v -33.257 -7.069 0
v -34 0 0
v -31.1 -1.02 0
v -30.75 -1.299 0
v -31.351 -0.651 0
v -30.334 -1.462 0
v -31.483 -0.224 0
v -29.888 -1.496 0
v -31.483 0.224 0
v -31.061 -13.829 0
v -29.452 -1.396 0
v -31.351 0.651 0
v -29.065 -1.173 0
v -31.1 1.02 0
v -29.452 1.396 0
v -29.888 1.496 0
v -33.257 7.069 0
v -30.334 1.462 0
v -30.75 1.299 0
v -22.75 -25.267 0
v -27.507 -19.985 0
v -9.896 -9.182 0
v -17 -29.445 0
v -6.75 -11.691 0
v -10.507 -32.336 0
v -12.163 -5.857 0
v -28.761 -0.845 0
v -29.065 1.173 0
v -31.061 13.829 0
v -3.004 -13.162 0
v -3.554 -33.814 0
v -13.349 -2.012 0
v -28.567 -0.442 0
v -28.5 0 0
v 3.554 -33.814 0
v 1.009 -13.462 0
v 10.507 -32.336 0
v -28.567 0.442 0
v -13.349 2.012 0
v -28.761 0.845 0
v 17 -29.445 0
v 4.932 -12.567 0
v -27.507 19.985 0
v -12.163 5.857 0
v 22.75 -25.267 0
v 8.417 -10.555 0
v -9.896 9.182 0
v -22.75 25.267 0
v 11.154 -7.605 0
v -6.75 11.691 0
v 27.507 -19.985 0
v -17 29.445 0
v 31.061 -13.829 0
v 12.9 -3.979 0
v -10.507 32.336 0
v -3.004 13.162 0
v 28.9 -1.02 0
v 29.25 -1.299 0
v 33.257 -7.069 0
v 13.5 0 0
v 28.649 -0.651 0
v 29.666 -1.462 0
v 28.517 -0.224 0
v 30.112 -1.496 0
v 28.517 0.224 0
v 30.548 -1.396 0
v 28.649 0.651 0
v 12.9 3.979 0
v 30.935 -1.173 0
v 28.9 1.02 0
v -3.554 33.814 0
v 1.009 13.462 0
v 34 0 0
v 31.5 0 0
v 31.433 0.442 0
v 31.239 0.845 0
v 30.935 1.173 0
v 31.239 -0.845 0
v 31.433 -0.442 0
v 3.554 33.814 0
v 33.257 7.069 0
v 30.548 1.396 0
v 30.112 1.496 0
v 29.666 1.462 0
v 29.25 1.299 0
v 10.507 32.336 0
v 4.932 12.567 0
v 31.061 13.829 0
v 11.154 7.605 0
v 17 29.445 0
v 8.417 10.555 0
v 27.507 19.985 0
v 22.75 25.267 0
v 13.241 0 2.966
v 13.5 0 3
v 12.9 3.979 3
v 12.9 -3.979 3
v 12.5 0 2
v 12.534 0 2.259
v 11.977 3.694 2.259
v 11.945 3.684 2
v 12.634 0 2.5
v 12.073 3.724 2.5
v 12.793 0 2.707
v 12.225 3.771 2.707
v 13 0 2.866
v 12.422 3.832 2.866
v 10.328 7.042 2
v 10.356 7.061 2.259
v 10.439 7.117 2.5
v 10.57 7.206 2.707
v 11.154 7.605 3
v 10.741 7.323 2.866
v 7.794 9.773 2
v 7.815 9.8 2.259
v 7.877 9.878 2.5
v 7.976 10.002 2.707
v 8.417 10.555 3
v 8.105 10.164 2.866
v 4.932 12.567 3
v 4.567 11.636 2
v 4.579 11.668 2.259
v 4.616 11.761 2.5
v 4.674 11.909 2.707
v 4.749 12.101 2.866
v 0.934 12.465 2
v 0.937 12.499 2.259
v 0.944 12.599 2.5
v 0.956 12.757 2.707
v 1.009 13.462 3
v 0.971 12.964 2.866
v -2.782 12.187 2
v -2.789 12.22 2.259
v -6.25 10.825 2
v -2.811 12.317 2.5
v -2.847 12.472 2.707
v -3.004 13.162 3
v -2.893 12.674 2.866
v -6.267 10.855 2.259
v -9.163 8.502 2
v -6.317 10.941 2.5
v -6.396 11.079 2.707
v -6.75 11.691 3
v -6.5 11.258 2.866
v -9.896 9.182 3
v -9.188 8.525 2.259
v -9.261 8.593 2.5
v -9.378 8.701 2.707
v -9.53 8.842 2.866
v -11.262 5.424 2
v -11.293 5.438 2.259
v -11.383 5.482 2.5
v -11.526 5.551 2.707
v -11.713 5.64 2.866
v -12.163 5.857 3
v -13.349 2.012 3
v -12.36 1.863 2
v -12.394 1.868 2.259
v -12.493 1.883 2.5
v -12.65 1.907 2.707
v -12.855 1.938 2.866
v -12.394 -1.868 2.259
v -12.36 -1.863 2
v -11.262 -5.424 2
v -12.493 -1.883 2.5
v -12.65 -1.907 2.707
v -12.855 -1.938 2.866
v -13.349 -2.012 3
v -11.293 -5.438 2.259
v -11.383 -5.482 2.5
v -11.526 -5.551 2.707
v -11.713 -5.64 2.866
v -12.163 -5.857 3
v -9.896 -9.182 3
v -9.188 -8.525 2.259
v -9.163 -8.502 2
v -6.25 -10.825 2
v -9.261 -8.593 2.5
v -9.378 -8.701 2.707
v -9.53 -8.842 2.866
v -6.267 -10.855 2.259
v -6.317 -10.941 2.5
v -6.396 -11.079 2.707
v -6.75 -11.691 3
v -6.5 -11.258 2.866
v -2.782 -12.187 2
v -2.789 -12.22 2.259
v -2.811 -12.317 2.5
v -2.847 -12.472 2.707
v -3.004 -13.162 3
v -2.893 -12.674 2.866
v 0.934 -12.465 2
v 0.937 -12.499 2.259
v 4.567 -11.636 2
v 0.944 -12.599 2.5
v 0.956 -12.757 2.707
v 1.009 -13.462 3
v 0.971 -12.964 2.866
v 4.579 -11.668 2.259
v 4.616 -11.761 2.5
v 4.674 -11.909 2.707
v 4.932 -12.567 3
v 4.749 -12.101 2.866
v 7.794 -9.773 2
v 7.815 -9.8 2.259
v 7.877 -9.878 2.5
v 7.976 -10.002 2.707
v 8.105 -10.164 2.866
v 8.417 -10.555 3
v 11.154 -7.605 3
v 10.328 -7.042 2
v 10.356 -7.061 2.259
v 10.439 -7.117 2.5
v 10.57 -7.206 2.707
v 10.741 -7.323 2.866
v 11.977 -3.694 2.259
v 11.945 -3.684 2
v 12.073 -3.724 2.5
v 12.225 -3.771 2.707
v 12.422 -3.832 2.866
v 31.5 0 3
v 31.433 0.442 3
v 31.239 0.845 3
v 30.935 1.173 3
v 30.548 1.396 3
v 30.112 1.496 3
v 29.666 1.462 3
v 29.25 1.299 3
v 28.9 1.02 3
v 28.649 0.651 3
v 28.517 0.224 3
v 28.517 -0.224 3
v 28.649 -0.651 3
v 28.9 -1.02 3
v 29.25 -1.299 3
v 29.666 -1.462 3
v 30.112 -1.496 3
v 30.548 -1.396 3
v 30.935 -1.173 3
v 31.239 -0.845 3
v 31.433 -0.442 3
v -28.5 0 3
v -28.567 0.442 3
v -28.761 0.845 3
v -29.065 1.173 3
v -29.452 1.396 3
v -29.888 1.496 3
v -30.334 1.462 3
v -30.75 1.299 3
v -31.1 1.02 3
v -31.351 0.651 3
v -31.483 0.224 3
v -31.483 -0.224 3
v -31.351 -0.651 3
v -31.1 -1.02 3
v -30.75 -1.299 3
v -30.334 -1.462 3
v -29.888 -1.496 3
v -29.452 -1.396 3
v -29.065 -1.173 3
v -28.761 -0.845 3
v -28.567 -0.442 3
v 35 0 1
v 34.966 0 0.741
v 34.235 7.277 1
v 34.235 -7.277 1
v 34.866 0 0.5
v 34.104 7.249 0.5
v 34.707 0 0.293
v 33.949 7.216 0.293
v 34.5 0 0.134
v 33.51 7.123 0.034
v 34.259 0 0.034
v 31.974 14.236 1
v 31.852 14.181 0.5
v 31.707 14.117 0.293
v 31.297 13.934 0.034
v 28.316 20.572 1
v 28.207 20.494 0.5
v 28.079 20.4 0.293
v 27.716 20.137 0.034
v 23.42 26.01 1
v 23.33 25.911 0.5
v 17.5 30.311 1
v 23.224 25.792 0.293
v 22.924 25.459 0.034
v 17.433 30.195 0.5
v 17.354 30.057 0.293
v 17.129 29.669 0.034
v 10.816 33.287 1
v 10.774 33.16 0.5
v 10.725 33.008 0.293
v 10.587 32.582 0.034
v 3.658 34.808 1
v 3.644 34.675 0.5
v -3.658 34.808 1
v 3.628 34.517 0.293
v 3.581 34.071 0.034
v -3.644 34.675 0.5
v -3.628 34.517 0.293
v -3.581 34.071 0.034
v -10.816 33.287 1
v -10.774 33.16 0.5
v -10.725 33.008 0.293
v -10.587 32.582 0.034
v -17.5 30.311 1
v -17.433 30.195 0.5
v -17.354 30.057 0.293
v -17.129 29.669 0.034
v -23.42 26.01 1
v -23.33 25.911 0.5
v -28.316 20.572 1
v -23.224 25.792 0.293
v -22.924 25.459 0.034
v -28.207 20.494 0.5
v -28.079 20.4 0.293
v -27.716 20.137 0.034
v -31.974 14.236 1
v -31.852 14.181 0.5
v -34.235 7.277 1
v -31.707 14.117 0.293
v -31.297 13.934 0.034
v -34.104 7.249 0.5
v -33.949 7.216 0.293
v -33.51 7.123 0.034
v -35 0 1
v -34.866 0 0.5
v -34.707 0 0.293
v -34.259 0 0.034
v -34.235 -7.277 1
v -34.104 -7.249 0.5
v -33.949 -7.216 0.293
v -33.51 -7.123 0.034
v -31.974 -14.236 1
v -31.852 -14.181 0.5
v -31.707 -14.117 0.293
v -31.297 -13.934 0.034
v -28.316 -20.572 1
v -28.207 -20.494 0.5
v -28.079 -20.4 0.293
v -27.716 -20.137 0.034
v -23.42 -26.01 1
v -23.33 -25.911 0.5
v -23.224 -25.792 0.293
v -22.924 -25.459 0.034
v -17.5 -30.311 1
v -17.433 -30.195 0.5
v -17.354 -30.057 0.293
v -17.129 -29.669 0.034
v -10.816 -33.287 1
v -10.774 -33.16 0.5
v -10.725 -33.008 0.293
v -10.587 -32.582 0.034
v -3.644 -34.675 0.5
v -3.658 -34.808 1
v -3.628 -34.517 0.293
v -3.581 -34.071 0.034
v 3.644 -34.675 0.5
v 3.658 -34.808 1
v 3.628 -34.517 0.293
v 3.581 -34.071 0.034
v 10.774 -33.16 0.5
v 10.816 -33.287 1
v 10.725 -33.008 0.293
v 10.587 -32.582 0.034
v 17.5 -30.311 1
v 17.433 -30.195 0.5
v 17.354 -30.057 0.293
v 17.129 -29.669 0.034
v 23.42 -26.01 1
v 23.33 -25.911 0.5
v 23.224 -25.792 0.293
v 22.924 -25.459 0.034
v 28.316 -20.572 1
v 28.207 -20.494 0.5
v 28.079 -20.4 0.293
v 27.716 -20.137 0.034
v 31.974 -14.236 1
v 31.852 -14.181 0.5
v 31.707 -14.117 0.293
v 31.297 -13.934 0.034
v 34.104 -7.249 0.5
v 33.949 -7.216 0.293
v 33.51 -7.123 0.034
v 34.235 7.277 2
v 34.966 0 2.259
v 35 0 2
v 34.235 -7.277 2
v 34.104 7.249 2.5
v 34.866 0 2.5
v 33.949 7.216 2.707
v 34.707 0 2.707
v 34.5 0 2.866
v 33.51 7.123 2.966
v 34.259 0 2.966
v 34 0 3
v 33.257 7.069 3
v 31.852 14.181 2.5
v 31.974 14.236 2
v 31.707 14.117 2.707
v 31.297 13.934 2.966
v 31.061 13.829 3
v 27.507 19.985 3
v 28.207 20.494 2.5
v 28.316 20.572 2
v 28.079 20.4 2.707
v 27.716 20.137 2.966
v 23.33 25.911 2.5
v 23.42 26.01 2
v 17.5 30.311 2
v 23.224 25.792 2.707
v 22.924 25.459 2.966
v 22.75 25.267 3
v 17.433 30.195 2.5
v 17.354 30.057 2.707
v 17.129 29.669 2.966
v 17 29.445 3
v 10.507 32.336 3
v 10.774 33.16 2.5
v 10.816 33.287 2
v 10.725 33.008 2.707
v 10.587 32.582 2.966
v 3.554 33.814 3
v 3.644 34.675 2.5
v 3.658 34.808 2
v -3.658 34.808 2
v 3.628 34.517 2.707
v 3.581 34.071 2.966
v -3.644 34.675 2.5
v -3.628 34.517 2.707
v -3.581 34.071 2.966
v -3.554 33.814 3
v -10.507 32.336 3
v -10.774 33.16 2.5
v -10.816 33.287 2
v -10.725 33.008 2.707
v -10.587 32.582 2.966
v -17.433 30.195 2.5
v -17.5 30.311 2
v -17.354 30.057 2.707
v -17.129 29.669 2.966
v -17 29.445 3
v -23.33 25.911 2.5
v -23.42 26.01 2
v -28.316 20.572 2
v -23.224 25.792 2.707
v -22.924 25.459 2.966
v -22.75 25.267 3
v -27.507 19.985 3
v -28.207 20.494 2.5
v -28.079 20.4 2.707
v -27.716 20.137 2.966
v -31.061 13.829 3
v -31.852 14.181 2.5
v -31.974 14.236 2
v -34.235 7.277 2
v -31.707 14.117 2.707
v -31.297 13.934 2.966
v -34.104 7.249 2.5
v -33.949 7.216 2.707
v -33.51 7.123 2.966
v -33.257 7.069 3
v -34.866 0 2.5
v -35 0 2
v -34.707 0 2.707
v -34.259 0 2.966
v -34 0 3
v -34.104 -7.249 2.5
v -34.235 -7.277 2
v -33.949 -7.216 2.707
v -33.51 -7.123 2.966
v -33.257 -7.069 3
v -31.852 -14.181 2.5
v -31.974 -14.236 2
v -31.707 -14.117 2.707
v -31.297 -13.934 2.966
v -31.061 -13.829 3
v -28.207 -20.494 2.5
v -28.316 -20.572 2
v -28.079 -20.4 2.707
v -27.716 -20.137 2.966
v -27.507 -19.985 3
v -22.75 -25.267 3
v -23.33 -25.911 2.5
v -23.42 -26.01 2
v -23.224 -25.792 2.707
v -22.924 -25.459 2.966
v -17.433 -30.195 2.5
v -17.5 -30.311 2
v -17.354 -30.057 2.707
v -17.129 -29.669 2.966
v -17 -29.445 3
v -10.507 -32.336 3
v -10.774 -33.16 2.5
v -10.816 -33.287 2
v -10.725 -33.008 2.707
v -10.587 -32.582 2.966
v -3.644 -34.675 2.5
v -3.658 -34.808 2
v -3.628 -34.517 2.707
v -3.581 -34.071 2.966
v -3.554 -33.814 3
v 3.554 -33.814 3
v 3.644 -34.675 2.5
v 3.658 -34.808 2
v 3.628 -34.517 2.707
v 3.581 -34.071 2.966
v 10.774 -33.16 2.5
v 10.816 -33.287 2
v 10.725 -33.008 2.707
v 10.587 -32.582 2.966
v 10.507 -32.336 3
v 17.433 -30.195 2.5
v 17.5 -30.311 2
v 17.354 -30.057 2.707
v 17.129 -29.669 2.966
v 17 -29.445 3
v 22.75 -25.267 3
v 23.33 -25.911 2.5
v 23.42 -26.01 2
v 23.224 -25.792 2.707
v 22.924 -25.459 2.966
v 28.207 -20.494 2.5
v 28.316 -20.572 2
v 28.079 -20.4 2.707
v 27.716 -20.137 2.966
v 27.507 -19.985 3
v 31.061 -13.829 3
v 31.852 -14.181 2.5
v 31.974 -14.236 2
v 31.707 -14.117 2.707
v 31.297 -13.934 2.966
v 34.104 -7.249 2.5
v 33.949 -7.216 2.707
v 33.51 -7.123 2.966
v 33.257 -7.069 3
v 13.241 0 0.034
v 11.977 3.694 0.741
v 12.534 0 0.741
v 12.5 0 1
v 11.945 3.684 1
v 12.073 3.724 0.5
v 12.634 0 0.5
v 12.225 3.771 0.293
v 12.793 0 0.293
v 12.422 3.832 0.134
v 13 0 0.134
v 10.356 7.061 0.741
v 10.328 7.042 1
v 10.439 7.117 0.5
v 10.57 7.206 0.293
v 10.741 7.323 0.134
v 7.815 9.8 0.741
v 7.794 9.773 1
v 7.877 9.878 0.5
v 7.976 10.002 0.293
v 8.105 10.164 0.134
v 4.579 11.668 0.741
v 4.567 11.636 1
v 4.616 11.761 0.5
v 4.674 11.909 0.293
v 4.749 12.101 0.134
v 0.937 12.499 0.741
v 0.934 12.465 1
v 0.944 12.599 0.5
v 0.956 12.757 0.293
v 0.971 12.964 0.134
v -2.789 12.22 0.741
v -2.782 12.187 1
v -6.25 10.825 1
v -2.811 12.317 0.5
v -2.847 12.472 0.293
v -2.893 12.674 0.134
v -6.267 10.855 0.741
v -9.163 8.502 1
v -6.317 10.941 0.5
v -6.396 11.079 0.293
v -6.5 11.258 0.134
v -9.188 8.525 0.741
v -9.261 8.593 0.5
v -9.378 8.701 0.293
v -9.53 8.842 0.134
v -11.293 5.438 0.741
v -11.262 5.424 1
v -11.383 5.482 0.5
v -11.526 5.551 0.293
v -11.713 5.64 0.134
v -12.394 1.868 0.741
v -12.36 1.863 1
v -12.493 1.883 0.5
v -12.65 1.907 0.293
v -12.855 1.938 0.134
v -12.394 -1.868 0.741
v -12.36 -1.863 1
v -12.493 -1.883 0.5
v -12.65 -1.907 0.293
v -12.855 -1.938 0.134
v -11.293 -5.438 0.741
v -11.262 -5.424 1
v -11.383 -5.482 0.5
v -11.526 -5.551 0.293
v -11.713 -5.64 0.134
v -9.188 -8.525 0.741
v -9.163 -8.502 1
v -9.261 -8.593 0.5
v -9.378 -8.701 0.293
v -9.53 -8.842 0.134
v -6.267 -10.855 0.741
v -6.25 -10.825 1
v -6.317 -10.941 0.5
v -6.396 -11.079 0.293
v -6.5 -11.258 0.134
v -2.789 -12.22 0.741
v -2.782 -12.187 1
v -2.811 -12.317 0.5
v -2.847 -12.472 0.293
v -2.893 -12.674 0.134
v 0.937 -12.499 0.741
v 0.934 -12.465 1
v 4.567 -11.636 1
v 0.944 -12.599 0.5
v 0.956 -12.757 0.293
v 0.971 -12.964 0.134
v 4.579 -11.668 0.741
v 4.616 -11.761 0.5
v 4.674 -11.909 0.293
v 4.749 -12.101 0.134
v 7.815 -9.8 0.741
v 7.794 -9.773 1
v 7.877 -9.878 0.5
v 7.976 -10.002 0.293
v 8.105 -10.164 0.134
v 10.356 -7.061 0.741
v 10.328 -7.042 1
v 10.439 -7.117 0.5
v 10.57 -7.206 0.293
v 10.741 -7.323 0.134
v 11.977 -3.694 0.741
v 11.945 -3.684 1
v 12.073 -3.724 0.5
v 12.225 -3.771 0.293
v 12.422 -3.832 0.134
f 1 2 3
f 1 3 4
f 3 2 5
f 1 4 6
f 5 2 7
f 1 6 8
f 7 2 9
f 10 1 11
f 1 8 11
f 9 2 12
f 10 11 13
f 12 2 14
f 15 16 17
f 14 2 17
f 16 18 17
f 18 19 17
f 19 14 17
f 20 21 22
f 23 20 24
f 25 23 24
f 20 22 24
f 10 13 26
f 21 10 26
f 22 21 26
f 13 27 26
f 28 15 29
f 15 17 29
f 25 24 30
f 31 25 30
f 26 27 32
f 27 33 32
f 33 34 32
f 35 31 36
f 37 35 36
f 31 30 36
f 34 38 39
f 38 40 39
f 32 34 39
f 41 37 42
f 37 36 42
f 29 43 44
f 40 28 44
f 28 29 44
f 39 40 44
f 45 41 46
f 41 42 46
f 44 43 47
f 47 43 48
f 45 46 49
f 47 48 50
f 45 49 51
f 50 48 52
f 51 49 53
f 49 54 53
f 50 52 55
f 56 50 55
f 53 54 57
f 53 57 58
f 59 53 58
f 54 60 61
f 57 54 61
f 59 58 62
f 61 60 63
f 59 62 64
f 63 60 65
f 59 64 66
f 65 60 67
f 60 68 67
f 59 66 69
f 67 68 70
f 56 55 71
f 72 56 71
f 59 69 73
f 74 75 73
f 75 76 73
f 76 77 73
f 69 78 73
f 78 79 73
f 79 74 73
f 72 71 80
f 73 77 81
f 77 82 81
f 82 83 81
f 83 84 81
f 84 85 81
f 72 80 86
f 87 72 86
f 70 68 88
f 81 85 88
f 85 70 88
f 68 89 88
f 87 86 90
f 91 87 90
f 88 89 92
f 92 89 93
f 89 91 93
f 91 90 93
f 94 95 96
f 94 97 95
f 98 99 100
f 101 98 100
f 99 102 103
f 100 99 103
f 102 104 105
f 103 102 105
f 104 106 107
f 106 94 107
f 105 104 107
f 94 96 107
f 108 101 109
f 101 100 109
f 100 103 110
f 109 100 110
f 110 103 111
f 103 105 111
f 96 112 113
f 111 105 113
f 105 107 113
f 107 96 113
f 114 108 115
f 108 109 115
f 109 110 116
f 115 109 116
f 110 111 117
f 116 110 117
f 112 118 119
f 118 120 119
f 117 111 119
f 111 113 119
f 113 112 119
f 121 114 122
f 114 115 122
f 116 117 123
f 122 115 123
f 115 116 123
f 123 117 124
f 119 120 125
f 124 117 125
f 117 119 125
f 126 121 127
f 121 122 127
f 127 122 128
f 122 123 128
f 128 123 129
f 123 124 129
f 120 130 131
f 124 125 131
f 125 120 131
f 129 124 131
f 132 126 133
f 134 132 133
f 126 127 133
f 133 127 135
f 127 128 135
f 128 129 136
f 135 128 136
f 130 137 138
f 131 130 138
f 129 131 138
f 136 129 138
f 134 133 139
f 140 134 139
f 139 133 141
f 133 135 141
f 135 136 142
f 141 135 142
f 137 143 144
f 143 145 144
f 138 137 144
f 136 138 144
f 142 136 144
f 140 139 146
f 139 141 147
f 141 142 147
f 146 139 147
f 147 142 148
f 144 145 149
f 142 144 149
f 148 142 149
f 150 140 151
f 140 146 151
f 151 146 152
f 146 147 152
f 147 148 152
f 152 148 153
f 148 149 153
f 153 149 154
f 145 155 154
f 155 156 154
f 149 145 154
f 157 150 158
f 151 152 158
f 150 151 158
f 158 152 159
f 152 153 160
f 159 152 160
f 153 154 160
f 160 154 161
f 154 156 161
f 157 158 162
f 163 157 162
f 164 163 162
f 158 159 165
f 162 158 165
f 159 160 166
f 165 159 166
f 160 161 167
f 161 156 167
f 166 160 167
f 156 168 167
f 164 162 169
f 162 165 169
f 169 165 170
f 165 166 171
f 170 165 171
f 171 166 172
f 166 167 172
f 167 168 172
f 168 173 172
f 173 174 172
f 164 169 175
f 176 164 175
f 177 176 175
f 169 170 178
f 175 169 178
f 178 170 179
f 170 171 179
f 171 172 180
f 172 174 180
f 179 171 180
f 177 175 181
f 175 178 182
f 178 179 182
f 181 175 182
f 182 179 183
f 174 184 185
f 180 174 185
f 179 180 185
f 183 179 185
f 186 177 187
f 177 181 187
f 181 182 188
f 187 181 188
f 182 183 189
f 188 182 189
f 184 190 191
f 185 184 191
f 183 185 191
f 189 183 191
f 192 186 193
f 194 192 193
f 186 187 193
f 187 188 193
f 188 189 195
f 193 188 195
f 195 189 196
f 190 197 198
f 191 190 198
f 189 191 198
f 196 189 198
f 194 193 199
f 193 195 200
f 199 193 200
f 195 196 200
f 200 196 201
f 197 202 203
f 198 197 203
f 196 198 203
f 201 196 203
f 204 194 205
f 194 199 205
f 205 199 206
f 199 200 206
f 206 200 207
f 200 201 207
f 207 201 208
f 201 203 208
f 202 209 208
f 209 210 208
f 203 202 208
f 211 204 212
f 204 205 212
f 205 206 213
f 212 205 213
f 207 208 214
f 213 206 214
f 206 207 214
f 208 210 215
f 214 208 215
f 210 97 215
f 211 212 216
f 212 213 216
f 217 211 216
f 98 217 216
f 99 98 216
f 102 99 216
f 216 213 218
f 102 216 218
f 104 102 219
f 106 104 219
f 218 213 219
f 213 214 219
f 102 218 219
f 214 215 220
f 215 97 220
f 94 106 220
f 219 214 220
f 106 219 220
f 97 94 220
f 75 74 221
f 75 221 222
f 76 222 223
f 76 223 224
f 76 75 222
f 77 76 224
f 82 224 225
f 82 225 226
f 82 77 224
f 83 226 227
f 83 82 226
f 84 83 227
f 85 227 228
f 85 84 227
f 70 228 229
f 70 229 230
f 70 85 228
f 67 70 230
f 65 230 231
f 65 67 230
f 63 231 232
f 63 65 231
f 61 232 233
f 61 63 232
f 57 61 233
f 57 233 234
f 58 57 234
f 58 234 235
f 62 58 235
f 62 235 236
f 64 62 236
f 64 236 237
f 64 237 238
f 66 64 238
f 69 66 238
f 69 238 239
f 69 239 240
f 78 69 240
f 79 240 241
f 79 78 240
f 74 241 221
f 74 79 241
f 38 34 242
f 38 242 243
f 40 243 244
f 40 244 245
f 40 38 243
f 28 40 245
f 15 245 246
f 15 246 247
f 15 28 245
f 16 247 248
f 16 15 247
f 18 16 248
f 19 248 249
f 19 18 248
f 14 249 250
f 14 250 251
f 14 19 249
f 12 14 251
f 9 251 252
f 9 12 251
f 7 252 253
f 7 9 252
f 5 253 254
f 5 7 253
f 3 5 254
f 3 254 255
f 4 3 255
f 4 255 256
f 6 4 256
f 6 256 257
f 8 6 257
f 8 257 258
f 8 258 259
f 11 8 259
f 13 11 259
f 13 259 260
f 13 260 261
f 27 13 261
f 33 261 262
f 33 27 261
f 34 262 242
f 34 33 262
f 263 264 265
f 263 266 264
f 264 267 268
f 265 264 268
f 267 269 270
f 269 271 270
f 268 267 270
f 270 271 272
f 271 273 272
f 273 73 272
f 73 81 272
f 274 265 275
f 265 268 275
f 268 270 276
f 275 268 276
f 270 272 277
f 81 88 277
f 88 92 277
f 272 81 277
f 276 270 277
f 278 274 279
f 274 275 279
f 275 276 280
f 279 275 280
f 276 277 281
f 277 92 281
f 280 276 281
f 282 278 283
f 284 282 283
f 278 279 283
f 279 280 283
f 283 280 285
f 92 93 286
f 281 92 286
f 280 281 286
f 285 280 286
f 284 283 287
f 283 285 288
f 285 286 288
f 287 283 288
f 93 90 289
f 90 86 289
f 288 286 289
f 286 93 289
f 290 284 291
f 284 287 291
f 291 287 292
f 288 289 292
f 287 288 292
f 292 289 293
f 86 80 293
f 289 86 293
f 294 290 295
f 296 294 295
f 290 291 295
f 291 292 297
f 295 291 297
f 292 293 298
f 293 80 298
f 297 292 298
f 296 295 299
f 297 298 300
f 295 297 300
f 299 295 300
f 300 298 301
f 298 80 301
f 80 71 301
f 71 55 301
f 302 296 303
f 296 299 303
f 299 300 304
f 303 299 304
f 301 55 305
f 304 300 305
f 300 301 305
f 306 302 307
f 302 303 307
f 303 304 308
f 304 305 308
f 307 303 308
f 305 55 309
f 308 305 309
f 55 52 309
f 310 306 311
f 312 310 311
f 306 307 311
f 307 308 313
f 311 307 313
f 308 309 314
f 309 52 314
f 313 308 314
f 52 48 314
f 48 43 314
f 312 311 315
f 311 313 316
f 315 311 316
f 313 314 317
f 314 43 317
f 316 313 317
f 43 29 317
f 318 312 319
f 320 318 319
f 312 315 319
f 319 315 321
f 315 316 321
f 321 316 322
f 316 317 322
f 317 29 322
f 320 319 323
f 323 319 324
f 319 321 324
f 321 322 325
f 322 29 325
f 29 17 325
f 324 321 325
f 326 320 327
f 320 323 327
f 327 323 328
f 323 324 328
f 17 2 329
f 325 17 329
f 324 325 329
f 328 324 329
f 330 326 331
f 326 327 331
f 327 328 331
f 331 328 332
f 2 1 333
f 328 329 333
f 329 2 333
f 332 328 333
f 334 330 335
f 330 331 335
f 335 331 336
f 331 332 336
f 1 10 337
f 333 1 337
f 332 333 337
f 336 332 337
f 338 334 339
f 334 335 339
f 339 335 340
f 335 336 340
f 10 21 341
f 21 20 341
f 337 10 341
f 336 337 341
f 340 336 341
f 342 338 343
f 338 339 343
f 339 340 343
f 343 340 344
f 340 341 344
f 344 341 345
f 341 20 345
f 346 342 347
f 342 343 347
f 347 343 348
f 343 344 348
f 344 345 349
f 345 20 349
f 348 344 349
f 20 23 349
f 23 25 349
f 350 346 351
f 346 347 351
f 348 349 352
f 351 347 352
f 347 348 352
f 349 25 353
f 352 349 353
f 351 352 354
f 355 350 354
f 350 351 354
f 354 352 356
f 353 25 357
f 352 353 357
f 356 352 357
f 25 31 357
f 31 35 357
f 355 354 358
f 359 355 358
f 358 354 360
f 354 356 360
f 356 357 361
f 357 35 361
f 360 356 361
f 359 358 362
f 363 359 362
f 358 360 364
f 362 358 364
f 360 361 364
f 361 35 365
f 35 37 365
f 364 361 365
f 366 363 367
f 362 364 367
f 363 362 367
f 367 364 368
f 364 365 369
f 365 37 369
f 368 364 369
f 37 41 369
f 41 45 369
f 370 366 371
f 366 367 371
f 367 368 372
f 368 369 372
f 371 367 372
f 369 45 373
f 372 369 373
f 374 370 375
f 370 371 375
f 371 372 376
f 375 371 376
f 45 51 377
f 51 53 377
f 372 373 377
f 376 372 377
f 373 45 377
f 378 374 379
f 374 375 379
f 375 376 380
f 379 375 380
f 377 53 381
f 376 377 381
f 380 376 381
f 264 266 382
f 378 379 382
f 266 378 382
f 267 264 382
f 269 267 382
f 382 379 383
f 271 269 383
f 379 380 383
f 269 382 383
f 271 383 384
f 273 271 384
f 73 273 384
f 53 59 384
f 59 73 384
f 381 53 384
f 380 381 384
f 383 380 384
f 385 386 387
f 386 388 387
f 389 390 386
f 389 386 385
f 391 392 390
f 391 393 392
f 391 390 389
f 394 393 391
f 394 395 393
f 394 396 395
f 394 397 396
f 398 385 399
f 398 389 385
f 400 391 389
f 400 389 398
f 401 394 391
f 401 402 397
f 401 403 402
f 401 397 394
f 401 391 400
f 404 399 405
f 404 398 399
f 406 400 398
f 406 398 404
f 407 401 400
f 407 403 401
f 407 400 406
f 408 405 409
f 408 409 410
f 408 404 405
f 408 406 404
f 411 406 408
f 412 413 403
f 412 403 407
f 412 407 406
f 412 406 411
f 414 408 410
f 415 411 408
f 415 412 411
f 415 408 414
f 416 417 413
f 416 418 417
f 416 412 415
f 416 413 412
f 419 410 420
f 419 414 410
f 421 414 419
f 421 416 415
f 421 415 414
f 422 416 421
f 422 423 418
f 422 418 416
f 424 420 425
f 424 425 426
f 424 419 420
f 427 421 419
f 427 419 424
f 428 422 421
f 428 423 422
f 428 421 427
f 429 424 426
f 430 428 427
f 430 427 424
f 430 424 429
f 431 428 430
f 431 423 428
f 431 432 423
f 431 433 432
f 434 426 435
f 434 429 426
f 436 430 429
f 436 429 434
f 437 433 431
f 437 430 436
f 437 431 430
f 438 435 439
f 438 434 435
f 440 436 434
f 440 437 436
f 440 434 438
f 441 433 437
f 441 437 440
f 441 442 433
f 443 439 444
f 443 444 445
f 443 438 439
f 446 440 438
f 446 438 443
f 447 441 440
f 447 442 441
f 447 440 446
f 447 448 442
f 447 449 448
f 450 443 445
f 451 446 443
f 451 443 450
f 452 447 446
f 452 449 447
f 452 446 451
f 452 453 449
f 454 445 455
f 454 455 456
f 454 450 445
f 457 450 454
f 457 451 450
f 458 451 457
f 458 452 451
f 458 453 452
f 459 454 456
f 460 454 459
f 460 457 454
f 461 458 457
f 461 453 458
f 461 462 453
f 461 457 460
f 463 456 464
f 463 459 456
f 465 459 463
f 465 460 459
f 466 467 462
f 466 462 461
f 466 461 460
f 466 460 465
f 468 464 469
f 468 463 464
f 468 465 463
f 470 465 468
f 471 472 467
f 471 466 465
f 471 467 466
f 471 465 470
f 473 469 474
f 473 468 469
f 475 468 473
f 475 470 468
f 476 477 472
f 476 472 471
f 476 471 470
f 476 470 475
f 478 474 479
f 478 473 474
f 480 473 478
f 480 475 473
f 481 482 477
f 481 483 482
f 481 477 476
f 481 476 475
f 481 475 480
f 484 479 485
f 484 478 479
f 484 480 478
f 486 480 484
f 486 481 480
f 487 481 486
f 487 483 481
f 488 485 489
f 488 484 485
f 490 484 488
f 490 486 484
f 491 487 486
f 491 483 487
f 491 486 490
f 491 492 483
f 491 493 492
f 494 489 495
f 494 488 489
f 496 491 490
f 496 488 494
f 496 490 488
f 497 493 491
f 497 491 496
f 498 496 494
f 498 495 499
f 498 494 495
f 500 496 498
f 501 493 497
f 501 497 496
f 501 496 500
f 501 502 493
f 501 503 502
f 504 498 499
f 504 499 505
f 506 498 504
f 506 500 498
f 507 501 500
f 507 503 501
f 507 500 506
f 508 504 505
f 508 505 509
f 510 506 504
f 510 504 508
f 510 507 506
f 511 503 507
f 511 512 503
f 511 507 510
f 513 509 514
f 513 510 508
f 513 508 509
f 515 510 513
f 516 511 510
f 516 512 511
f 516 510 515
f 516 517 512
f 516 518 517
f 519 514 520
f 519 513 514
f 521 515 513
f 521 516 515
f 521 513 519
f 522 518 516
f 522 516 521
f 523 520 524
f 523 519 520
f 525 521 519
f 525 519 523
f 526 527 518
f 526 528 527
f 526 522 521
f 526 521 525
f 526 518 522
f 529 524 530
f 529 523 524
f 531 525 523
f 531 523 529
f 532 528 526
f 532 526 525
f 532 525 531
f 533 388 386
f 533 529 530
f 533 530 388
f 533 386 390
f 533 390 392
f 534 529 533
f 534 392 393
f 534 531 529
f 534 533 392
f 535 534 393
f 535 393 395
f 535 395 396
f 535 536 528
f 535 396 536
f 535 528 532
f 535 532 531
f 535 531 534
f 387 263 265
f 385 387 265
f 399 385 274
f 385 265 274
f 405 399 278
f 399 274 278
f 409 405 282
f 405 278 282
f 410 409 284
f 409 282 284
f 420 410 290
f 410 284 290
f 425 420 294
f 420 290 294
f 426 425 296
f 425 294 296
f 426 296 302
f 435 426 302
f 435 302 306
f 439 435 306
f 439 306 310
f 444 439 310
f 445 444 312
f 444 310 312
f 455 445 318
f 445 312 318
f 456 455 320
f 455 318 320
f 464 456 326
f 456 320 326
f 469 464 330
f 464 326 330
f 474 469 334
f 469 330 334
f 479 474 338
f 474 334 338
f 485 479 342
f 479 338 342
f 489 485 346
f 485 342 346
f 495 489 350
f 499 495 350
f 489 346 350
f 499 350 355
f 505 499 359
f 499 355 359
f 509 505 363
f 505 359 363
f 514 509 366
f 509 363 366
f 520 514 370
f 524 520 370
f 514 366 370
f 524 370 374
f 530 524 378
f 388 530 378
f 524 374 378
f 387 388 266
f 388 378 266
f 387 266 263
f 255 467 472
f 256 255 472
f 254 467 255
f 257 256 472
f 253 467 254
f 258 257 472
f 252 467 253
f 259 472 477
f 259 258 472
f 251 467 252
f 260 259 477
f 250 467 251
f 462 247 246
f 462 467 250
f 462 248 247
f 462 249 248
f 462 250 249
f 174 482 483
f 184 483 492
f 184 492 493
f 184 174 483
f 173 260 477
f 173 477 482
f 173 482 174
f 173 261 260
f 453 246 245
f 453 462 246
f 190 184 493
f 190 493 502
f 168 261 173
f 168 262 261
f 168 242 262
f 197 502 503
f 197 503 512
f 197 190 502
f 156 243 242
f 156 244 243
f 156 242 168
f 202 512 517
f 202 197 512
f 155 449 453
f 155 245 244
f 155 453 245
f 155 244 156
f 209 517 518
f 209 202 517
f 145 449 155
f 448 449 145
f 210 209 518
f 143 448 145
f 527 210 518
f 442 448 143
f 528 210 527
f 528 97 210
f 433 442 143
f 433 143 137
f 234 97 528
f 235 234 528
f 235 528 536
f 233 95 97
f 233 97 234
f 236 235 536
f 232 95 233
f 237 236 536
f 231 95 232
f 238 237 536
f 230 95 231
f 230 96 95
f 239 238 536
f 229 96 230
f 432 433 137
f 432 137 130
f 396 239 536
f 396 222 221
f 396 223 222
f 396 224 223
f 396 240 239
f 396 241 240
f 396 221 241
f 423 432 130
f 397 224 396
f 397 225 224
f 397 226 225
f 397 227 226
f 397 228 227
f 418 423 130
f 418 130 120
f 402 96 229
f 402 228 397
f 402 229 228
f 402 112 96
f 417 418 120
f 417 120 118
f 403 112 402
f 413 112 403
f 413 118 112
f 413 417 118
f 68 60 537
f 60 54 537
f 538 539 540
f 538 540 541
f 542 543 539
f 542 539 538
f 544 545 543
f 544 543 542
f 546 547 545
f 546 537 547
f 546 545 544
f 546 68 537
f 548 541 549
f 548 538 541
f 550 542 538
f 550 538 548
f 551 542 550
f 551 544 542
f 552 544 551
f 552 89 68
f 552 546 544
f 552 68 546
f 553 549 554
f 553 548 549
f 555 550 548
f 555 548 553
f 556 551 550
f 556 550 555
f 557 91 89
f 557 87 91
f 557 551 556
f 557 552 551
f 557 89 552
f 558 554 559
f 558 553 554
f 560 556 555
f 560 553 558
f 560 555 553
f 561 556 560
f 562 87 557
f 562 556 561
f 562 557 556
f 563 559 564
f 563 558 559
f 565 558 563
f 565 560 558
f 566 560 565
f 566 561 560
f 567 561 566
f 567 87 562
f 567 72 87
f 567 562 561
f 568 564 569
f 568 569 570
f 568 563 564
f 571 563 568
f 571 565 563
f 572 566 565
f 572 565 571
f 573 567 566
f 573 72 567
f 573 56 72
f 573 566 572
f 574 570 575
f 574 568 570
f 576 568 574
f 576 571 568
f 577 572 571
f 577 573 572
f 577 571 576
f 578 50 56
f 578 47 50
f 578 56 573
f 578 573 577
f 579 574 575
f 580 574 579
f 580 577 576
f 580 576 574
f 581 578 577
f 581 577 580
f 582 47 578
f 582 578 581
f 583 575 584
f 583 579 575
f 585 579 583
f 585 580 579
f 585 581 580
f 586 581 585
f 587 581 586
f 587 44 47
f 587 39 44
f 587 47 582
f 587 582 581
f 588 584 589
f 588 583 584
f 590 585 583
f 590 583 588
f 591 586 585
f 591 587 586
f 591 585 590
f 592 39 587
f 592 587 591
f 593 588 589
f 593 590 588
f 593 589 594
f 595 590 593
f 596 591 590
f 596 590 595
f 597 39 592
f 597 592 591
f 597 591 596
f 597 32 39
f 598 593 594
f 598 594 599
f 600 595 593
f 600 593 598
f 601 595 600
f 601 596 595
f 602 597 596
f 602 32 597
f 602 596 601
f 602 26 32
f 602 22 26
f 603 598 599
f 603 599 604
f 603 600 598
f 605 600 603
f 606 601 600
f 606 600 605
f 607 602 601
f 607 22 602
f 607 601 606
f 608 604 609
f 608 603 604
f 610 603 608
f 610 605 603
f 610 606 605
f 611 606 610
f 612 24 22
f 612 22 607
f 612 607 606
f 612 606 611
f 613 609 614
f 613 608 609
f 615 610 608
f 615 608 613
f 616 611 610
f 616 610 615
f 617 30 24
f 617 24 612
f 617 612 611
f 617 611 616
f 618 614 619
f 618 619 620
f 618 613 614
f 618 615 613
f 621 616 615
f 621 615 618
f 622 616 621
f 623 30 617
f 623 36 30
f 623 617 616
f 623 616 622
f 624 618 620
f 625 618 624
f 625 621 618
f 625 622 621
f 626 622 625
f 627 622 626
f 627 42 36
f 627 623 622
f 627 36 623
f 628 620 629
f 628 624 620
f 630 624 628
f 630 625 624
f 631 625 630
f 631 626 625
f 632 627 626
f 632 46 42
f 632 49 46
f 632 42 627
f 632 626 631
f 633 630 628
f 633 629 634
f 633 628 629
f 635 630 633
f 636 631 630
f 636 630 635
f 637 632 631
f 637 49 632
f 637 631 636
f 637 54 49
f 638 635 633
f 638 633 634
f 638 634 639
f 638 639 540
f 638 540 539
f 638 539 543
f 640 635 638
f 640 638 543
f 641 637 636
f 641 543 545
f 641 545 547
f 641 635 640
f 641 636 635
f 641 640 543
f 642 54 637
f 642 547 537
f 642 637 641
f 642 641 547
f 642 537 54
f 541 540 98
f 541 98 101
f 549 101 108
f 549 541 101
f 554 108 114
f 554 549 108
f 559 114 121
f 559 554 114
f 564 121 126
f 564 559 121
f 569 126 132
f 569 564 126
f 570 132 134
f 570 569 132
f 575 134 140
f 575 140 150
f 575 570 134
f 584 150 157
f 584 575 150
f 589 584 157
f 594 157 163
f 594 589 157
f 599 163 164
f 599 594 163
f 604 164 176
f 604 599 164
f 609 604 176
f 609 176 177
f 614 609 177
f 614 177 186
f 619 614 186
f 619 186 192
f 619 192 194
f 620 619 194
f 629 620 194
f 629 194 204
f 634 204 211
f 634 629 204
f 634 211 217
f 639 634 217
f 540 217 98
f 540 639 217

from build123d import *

# Parameters (mm, degrees)
CROQUIS1_R              = 35
CROQUIS1_R_2            = 12.5
CROQUIS1_R_3            = 1.5
SALIENTE_EXTRUIR1_DEPTH = 3
REDONDEO1_R             = 1


with BuildPart() as part:
    # Croquis1 → Saliente-Extruir1 (new body)
    with BuildSketch(Plane.XY):
        Circle(CROQUIS1_R)
        Circle(CROQUIS1_R_2, mode=Mode.SUBTRACT)
        with Locations((30, 0)):
            Circle(CROQUIS1_R_3, mode=Mode.SUBTRACT)
        with Locations((-30, 0)):
            Circle(CROQUIS1_R_3, mode=Mode.SUBTRACT)
    extrude(amount=SALIENTE_EXTRUIR1_DEPTH)

    # Redondeo1
    redondeo1_edges = [part.edges().sort_by_distance(p)[0] for p in [
        (-35, 0, 0),
        (-35, 0, 3),
        (-12.5, 0, 0),
        (-12.5, 0, 3),
    ]]
    fillet(redondeo1_edges, radius=REDONDEO1_R)


solid = part.part
